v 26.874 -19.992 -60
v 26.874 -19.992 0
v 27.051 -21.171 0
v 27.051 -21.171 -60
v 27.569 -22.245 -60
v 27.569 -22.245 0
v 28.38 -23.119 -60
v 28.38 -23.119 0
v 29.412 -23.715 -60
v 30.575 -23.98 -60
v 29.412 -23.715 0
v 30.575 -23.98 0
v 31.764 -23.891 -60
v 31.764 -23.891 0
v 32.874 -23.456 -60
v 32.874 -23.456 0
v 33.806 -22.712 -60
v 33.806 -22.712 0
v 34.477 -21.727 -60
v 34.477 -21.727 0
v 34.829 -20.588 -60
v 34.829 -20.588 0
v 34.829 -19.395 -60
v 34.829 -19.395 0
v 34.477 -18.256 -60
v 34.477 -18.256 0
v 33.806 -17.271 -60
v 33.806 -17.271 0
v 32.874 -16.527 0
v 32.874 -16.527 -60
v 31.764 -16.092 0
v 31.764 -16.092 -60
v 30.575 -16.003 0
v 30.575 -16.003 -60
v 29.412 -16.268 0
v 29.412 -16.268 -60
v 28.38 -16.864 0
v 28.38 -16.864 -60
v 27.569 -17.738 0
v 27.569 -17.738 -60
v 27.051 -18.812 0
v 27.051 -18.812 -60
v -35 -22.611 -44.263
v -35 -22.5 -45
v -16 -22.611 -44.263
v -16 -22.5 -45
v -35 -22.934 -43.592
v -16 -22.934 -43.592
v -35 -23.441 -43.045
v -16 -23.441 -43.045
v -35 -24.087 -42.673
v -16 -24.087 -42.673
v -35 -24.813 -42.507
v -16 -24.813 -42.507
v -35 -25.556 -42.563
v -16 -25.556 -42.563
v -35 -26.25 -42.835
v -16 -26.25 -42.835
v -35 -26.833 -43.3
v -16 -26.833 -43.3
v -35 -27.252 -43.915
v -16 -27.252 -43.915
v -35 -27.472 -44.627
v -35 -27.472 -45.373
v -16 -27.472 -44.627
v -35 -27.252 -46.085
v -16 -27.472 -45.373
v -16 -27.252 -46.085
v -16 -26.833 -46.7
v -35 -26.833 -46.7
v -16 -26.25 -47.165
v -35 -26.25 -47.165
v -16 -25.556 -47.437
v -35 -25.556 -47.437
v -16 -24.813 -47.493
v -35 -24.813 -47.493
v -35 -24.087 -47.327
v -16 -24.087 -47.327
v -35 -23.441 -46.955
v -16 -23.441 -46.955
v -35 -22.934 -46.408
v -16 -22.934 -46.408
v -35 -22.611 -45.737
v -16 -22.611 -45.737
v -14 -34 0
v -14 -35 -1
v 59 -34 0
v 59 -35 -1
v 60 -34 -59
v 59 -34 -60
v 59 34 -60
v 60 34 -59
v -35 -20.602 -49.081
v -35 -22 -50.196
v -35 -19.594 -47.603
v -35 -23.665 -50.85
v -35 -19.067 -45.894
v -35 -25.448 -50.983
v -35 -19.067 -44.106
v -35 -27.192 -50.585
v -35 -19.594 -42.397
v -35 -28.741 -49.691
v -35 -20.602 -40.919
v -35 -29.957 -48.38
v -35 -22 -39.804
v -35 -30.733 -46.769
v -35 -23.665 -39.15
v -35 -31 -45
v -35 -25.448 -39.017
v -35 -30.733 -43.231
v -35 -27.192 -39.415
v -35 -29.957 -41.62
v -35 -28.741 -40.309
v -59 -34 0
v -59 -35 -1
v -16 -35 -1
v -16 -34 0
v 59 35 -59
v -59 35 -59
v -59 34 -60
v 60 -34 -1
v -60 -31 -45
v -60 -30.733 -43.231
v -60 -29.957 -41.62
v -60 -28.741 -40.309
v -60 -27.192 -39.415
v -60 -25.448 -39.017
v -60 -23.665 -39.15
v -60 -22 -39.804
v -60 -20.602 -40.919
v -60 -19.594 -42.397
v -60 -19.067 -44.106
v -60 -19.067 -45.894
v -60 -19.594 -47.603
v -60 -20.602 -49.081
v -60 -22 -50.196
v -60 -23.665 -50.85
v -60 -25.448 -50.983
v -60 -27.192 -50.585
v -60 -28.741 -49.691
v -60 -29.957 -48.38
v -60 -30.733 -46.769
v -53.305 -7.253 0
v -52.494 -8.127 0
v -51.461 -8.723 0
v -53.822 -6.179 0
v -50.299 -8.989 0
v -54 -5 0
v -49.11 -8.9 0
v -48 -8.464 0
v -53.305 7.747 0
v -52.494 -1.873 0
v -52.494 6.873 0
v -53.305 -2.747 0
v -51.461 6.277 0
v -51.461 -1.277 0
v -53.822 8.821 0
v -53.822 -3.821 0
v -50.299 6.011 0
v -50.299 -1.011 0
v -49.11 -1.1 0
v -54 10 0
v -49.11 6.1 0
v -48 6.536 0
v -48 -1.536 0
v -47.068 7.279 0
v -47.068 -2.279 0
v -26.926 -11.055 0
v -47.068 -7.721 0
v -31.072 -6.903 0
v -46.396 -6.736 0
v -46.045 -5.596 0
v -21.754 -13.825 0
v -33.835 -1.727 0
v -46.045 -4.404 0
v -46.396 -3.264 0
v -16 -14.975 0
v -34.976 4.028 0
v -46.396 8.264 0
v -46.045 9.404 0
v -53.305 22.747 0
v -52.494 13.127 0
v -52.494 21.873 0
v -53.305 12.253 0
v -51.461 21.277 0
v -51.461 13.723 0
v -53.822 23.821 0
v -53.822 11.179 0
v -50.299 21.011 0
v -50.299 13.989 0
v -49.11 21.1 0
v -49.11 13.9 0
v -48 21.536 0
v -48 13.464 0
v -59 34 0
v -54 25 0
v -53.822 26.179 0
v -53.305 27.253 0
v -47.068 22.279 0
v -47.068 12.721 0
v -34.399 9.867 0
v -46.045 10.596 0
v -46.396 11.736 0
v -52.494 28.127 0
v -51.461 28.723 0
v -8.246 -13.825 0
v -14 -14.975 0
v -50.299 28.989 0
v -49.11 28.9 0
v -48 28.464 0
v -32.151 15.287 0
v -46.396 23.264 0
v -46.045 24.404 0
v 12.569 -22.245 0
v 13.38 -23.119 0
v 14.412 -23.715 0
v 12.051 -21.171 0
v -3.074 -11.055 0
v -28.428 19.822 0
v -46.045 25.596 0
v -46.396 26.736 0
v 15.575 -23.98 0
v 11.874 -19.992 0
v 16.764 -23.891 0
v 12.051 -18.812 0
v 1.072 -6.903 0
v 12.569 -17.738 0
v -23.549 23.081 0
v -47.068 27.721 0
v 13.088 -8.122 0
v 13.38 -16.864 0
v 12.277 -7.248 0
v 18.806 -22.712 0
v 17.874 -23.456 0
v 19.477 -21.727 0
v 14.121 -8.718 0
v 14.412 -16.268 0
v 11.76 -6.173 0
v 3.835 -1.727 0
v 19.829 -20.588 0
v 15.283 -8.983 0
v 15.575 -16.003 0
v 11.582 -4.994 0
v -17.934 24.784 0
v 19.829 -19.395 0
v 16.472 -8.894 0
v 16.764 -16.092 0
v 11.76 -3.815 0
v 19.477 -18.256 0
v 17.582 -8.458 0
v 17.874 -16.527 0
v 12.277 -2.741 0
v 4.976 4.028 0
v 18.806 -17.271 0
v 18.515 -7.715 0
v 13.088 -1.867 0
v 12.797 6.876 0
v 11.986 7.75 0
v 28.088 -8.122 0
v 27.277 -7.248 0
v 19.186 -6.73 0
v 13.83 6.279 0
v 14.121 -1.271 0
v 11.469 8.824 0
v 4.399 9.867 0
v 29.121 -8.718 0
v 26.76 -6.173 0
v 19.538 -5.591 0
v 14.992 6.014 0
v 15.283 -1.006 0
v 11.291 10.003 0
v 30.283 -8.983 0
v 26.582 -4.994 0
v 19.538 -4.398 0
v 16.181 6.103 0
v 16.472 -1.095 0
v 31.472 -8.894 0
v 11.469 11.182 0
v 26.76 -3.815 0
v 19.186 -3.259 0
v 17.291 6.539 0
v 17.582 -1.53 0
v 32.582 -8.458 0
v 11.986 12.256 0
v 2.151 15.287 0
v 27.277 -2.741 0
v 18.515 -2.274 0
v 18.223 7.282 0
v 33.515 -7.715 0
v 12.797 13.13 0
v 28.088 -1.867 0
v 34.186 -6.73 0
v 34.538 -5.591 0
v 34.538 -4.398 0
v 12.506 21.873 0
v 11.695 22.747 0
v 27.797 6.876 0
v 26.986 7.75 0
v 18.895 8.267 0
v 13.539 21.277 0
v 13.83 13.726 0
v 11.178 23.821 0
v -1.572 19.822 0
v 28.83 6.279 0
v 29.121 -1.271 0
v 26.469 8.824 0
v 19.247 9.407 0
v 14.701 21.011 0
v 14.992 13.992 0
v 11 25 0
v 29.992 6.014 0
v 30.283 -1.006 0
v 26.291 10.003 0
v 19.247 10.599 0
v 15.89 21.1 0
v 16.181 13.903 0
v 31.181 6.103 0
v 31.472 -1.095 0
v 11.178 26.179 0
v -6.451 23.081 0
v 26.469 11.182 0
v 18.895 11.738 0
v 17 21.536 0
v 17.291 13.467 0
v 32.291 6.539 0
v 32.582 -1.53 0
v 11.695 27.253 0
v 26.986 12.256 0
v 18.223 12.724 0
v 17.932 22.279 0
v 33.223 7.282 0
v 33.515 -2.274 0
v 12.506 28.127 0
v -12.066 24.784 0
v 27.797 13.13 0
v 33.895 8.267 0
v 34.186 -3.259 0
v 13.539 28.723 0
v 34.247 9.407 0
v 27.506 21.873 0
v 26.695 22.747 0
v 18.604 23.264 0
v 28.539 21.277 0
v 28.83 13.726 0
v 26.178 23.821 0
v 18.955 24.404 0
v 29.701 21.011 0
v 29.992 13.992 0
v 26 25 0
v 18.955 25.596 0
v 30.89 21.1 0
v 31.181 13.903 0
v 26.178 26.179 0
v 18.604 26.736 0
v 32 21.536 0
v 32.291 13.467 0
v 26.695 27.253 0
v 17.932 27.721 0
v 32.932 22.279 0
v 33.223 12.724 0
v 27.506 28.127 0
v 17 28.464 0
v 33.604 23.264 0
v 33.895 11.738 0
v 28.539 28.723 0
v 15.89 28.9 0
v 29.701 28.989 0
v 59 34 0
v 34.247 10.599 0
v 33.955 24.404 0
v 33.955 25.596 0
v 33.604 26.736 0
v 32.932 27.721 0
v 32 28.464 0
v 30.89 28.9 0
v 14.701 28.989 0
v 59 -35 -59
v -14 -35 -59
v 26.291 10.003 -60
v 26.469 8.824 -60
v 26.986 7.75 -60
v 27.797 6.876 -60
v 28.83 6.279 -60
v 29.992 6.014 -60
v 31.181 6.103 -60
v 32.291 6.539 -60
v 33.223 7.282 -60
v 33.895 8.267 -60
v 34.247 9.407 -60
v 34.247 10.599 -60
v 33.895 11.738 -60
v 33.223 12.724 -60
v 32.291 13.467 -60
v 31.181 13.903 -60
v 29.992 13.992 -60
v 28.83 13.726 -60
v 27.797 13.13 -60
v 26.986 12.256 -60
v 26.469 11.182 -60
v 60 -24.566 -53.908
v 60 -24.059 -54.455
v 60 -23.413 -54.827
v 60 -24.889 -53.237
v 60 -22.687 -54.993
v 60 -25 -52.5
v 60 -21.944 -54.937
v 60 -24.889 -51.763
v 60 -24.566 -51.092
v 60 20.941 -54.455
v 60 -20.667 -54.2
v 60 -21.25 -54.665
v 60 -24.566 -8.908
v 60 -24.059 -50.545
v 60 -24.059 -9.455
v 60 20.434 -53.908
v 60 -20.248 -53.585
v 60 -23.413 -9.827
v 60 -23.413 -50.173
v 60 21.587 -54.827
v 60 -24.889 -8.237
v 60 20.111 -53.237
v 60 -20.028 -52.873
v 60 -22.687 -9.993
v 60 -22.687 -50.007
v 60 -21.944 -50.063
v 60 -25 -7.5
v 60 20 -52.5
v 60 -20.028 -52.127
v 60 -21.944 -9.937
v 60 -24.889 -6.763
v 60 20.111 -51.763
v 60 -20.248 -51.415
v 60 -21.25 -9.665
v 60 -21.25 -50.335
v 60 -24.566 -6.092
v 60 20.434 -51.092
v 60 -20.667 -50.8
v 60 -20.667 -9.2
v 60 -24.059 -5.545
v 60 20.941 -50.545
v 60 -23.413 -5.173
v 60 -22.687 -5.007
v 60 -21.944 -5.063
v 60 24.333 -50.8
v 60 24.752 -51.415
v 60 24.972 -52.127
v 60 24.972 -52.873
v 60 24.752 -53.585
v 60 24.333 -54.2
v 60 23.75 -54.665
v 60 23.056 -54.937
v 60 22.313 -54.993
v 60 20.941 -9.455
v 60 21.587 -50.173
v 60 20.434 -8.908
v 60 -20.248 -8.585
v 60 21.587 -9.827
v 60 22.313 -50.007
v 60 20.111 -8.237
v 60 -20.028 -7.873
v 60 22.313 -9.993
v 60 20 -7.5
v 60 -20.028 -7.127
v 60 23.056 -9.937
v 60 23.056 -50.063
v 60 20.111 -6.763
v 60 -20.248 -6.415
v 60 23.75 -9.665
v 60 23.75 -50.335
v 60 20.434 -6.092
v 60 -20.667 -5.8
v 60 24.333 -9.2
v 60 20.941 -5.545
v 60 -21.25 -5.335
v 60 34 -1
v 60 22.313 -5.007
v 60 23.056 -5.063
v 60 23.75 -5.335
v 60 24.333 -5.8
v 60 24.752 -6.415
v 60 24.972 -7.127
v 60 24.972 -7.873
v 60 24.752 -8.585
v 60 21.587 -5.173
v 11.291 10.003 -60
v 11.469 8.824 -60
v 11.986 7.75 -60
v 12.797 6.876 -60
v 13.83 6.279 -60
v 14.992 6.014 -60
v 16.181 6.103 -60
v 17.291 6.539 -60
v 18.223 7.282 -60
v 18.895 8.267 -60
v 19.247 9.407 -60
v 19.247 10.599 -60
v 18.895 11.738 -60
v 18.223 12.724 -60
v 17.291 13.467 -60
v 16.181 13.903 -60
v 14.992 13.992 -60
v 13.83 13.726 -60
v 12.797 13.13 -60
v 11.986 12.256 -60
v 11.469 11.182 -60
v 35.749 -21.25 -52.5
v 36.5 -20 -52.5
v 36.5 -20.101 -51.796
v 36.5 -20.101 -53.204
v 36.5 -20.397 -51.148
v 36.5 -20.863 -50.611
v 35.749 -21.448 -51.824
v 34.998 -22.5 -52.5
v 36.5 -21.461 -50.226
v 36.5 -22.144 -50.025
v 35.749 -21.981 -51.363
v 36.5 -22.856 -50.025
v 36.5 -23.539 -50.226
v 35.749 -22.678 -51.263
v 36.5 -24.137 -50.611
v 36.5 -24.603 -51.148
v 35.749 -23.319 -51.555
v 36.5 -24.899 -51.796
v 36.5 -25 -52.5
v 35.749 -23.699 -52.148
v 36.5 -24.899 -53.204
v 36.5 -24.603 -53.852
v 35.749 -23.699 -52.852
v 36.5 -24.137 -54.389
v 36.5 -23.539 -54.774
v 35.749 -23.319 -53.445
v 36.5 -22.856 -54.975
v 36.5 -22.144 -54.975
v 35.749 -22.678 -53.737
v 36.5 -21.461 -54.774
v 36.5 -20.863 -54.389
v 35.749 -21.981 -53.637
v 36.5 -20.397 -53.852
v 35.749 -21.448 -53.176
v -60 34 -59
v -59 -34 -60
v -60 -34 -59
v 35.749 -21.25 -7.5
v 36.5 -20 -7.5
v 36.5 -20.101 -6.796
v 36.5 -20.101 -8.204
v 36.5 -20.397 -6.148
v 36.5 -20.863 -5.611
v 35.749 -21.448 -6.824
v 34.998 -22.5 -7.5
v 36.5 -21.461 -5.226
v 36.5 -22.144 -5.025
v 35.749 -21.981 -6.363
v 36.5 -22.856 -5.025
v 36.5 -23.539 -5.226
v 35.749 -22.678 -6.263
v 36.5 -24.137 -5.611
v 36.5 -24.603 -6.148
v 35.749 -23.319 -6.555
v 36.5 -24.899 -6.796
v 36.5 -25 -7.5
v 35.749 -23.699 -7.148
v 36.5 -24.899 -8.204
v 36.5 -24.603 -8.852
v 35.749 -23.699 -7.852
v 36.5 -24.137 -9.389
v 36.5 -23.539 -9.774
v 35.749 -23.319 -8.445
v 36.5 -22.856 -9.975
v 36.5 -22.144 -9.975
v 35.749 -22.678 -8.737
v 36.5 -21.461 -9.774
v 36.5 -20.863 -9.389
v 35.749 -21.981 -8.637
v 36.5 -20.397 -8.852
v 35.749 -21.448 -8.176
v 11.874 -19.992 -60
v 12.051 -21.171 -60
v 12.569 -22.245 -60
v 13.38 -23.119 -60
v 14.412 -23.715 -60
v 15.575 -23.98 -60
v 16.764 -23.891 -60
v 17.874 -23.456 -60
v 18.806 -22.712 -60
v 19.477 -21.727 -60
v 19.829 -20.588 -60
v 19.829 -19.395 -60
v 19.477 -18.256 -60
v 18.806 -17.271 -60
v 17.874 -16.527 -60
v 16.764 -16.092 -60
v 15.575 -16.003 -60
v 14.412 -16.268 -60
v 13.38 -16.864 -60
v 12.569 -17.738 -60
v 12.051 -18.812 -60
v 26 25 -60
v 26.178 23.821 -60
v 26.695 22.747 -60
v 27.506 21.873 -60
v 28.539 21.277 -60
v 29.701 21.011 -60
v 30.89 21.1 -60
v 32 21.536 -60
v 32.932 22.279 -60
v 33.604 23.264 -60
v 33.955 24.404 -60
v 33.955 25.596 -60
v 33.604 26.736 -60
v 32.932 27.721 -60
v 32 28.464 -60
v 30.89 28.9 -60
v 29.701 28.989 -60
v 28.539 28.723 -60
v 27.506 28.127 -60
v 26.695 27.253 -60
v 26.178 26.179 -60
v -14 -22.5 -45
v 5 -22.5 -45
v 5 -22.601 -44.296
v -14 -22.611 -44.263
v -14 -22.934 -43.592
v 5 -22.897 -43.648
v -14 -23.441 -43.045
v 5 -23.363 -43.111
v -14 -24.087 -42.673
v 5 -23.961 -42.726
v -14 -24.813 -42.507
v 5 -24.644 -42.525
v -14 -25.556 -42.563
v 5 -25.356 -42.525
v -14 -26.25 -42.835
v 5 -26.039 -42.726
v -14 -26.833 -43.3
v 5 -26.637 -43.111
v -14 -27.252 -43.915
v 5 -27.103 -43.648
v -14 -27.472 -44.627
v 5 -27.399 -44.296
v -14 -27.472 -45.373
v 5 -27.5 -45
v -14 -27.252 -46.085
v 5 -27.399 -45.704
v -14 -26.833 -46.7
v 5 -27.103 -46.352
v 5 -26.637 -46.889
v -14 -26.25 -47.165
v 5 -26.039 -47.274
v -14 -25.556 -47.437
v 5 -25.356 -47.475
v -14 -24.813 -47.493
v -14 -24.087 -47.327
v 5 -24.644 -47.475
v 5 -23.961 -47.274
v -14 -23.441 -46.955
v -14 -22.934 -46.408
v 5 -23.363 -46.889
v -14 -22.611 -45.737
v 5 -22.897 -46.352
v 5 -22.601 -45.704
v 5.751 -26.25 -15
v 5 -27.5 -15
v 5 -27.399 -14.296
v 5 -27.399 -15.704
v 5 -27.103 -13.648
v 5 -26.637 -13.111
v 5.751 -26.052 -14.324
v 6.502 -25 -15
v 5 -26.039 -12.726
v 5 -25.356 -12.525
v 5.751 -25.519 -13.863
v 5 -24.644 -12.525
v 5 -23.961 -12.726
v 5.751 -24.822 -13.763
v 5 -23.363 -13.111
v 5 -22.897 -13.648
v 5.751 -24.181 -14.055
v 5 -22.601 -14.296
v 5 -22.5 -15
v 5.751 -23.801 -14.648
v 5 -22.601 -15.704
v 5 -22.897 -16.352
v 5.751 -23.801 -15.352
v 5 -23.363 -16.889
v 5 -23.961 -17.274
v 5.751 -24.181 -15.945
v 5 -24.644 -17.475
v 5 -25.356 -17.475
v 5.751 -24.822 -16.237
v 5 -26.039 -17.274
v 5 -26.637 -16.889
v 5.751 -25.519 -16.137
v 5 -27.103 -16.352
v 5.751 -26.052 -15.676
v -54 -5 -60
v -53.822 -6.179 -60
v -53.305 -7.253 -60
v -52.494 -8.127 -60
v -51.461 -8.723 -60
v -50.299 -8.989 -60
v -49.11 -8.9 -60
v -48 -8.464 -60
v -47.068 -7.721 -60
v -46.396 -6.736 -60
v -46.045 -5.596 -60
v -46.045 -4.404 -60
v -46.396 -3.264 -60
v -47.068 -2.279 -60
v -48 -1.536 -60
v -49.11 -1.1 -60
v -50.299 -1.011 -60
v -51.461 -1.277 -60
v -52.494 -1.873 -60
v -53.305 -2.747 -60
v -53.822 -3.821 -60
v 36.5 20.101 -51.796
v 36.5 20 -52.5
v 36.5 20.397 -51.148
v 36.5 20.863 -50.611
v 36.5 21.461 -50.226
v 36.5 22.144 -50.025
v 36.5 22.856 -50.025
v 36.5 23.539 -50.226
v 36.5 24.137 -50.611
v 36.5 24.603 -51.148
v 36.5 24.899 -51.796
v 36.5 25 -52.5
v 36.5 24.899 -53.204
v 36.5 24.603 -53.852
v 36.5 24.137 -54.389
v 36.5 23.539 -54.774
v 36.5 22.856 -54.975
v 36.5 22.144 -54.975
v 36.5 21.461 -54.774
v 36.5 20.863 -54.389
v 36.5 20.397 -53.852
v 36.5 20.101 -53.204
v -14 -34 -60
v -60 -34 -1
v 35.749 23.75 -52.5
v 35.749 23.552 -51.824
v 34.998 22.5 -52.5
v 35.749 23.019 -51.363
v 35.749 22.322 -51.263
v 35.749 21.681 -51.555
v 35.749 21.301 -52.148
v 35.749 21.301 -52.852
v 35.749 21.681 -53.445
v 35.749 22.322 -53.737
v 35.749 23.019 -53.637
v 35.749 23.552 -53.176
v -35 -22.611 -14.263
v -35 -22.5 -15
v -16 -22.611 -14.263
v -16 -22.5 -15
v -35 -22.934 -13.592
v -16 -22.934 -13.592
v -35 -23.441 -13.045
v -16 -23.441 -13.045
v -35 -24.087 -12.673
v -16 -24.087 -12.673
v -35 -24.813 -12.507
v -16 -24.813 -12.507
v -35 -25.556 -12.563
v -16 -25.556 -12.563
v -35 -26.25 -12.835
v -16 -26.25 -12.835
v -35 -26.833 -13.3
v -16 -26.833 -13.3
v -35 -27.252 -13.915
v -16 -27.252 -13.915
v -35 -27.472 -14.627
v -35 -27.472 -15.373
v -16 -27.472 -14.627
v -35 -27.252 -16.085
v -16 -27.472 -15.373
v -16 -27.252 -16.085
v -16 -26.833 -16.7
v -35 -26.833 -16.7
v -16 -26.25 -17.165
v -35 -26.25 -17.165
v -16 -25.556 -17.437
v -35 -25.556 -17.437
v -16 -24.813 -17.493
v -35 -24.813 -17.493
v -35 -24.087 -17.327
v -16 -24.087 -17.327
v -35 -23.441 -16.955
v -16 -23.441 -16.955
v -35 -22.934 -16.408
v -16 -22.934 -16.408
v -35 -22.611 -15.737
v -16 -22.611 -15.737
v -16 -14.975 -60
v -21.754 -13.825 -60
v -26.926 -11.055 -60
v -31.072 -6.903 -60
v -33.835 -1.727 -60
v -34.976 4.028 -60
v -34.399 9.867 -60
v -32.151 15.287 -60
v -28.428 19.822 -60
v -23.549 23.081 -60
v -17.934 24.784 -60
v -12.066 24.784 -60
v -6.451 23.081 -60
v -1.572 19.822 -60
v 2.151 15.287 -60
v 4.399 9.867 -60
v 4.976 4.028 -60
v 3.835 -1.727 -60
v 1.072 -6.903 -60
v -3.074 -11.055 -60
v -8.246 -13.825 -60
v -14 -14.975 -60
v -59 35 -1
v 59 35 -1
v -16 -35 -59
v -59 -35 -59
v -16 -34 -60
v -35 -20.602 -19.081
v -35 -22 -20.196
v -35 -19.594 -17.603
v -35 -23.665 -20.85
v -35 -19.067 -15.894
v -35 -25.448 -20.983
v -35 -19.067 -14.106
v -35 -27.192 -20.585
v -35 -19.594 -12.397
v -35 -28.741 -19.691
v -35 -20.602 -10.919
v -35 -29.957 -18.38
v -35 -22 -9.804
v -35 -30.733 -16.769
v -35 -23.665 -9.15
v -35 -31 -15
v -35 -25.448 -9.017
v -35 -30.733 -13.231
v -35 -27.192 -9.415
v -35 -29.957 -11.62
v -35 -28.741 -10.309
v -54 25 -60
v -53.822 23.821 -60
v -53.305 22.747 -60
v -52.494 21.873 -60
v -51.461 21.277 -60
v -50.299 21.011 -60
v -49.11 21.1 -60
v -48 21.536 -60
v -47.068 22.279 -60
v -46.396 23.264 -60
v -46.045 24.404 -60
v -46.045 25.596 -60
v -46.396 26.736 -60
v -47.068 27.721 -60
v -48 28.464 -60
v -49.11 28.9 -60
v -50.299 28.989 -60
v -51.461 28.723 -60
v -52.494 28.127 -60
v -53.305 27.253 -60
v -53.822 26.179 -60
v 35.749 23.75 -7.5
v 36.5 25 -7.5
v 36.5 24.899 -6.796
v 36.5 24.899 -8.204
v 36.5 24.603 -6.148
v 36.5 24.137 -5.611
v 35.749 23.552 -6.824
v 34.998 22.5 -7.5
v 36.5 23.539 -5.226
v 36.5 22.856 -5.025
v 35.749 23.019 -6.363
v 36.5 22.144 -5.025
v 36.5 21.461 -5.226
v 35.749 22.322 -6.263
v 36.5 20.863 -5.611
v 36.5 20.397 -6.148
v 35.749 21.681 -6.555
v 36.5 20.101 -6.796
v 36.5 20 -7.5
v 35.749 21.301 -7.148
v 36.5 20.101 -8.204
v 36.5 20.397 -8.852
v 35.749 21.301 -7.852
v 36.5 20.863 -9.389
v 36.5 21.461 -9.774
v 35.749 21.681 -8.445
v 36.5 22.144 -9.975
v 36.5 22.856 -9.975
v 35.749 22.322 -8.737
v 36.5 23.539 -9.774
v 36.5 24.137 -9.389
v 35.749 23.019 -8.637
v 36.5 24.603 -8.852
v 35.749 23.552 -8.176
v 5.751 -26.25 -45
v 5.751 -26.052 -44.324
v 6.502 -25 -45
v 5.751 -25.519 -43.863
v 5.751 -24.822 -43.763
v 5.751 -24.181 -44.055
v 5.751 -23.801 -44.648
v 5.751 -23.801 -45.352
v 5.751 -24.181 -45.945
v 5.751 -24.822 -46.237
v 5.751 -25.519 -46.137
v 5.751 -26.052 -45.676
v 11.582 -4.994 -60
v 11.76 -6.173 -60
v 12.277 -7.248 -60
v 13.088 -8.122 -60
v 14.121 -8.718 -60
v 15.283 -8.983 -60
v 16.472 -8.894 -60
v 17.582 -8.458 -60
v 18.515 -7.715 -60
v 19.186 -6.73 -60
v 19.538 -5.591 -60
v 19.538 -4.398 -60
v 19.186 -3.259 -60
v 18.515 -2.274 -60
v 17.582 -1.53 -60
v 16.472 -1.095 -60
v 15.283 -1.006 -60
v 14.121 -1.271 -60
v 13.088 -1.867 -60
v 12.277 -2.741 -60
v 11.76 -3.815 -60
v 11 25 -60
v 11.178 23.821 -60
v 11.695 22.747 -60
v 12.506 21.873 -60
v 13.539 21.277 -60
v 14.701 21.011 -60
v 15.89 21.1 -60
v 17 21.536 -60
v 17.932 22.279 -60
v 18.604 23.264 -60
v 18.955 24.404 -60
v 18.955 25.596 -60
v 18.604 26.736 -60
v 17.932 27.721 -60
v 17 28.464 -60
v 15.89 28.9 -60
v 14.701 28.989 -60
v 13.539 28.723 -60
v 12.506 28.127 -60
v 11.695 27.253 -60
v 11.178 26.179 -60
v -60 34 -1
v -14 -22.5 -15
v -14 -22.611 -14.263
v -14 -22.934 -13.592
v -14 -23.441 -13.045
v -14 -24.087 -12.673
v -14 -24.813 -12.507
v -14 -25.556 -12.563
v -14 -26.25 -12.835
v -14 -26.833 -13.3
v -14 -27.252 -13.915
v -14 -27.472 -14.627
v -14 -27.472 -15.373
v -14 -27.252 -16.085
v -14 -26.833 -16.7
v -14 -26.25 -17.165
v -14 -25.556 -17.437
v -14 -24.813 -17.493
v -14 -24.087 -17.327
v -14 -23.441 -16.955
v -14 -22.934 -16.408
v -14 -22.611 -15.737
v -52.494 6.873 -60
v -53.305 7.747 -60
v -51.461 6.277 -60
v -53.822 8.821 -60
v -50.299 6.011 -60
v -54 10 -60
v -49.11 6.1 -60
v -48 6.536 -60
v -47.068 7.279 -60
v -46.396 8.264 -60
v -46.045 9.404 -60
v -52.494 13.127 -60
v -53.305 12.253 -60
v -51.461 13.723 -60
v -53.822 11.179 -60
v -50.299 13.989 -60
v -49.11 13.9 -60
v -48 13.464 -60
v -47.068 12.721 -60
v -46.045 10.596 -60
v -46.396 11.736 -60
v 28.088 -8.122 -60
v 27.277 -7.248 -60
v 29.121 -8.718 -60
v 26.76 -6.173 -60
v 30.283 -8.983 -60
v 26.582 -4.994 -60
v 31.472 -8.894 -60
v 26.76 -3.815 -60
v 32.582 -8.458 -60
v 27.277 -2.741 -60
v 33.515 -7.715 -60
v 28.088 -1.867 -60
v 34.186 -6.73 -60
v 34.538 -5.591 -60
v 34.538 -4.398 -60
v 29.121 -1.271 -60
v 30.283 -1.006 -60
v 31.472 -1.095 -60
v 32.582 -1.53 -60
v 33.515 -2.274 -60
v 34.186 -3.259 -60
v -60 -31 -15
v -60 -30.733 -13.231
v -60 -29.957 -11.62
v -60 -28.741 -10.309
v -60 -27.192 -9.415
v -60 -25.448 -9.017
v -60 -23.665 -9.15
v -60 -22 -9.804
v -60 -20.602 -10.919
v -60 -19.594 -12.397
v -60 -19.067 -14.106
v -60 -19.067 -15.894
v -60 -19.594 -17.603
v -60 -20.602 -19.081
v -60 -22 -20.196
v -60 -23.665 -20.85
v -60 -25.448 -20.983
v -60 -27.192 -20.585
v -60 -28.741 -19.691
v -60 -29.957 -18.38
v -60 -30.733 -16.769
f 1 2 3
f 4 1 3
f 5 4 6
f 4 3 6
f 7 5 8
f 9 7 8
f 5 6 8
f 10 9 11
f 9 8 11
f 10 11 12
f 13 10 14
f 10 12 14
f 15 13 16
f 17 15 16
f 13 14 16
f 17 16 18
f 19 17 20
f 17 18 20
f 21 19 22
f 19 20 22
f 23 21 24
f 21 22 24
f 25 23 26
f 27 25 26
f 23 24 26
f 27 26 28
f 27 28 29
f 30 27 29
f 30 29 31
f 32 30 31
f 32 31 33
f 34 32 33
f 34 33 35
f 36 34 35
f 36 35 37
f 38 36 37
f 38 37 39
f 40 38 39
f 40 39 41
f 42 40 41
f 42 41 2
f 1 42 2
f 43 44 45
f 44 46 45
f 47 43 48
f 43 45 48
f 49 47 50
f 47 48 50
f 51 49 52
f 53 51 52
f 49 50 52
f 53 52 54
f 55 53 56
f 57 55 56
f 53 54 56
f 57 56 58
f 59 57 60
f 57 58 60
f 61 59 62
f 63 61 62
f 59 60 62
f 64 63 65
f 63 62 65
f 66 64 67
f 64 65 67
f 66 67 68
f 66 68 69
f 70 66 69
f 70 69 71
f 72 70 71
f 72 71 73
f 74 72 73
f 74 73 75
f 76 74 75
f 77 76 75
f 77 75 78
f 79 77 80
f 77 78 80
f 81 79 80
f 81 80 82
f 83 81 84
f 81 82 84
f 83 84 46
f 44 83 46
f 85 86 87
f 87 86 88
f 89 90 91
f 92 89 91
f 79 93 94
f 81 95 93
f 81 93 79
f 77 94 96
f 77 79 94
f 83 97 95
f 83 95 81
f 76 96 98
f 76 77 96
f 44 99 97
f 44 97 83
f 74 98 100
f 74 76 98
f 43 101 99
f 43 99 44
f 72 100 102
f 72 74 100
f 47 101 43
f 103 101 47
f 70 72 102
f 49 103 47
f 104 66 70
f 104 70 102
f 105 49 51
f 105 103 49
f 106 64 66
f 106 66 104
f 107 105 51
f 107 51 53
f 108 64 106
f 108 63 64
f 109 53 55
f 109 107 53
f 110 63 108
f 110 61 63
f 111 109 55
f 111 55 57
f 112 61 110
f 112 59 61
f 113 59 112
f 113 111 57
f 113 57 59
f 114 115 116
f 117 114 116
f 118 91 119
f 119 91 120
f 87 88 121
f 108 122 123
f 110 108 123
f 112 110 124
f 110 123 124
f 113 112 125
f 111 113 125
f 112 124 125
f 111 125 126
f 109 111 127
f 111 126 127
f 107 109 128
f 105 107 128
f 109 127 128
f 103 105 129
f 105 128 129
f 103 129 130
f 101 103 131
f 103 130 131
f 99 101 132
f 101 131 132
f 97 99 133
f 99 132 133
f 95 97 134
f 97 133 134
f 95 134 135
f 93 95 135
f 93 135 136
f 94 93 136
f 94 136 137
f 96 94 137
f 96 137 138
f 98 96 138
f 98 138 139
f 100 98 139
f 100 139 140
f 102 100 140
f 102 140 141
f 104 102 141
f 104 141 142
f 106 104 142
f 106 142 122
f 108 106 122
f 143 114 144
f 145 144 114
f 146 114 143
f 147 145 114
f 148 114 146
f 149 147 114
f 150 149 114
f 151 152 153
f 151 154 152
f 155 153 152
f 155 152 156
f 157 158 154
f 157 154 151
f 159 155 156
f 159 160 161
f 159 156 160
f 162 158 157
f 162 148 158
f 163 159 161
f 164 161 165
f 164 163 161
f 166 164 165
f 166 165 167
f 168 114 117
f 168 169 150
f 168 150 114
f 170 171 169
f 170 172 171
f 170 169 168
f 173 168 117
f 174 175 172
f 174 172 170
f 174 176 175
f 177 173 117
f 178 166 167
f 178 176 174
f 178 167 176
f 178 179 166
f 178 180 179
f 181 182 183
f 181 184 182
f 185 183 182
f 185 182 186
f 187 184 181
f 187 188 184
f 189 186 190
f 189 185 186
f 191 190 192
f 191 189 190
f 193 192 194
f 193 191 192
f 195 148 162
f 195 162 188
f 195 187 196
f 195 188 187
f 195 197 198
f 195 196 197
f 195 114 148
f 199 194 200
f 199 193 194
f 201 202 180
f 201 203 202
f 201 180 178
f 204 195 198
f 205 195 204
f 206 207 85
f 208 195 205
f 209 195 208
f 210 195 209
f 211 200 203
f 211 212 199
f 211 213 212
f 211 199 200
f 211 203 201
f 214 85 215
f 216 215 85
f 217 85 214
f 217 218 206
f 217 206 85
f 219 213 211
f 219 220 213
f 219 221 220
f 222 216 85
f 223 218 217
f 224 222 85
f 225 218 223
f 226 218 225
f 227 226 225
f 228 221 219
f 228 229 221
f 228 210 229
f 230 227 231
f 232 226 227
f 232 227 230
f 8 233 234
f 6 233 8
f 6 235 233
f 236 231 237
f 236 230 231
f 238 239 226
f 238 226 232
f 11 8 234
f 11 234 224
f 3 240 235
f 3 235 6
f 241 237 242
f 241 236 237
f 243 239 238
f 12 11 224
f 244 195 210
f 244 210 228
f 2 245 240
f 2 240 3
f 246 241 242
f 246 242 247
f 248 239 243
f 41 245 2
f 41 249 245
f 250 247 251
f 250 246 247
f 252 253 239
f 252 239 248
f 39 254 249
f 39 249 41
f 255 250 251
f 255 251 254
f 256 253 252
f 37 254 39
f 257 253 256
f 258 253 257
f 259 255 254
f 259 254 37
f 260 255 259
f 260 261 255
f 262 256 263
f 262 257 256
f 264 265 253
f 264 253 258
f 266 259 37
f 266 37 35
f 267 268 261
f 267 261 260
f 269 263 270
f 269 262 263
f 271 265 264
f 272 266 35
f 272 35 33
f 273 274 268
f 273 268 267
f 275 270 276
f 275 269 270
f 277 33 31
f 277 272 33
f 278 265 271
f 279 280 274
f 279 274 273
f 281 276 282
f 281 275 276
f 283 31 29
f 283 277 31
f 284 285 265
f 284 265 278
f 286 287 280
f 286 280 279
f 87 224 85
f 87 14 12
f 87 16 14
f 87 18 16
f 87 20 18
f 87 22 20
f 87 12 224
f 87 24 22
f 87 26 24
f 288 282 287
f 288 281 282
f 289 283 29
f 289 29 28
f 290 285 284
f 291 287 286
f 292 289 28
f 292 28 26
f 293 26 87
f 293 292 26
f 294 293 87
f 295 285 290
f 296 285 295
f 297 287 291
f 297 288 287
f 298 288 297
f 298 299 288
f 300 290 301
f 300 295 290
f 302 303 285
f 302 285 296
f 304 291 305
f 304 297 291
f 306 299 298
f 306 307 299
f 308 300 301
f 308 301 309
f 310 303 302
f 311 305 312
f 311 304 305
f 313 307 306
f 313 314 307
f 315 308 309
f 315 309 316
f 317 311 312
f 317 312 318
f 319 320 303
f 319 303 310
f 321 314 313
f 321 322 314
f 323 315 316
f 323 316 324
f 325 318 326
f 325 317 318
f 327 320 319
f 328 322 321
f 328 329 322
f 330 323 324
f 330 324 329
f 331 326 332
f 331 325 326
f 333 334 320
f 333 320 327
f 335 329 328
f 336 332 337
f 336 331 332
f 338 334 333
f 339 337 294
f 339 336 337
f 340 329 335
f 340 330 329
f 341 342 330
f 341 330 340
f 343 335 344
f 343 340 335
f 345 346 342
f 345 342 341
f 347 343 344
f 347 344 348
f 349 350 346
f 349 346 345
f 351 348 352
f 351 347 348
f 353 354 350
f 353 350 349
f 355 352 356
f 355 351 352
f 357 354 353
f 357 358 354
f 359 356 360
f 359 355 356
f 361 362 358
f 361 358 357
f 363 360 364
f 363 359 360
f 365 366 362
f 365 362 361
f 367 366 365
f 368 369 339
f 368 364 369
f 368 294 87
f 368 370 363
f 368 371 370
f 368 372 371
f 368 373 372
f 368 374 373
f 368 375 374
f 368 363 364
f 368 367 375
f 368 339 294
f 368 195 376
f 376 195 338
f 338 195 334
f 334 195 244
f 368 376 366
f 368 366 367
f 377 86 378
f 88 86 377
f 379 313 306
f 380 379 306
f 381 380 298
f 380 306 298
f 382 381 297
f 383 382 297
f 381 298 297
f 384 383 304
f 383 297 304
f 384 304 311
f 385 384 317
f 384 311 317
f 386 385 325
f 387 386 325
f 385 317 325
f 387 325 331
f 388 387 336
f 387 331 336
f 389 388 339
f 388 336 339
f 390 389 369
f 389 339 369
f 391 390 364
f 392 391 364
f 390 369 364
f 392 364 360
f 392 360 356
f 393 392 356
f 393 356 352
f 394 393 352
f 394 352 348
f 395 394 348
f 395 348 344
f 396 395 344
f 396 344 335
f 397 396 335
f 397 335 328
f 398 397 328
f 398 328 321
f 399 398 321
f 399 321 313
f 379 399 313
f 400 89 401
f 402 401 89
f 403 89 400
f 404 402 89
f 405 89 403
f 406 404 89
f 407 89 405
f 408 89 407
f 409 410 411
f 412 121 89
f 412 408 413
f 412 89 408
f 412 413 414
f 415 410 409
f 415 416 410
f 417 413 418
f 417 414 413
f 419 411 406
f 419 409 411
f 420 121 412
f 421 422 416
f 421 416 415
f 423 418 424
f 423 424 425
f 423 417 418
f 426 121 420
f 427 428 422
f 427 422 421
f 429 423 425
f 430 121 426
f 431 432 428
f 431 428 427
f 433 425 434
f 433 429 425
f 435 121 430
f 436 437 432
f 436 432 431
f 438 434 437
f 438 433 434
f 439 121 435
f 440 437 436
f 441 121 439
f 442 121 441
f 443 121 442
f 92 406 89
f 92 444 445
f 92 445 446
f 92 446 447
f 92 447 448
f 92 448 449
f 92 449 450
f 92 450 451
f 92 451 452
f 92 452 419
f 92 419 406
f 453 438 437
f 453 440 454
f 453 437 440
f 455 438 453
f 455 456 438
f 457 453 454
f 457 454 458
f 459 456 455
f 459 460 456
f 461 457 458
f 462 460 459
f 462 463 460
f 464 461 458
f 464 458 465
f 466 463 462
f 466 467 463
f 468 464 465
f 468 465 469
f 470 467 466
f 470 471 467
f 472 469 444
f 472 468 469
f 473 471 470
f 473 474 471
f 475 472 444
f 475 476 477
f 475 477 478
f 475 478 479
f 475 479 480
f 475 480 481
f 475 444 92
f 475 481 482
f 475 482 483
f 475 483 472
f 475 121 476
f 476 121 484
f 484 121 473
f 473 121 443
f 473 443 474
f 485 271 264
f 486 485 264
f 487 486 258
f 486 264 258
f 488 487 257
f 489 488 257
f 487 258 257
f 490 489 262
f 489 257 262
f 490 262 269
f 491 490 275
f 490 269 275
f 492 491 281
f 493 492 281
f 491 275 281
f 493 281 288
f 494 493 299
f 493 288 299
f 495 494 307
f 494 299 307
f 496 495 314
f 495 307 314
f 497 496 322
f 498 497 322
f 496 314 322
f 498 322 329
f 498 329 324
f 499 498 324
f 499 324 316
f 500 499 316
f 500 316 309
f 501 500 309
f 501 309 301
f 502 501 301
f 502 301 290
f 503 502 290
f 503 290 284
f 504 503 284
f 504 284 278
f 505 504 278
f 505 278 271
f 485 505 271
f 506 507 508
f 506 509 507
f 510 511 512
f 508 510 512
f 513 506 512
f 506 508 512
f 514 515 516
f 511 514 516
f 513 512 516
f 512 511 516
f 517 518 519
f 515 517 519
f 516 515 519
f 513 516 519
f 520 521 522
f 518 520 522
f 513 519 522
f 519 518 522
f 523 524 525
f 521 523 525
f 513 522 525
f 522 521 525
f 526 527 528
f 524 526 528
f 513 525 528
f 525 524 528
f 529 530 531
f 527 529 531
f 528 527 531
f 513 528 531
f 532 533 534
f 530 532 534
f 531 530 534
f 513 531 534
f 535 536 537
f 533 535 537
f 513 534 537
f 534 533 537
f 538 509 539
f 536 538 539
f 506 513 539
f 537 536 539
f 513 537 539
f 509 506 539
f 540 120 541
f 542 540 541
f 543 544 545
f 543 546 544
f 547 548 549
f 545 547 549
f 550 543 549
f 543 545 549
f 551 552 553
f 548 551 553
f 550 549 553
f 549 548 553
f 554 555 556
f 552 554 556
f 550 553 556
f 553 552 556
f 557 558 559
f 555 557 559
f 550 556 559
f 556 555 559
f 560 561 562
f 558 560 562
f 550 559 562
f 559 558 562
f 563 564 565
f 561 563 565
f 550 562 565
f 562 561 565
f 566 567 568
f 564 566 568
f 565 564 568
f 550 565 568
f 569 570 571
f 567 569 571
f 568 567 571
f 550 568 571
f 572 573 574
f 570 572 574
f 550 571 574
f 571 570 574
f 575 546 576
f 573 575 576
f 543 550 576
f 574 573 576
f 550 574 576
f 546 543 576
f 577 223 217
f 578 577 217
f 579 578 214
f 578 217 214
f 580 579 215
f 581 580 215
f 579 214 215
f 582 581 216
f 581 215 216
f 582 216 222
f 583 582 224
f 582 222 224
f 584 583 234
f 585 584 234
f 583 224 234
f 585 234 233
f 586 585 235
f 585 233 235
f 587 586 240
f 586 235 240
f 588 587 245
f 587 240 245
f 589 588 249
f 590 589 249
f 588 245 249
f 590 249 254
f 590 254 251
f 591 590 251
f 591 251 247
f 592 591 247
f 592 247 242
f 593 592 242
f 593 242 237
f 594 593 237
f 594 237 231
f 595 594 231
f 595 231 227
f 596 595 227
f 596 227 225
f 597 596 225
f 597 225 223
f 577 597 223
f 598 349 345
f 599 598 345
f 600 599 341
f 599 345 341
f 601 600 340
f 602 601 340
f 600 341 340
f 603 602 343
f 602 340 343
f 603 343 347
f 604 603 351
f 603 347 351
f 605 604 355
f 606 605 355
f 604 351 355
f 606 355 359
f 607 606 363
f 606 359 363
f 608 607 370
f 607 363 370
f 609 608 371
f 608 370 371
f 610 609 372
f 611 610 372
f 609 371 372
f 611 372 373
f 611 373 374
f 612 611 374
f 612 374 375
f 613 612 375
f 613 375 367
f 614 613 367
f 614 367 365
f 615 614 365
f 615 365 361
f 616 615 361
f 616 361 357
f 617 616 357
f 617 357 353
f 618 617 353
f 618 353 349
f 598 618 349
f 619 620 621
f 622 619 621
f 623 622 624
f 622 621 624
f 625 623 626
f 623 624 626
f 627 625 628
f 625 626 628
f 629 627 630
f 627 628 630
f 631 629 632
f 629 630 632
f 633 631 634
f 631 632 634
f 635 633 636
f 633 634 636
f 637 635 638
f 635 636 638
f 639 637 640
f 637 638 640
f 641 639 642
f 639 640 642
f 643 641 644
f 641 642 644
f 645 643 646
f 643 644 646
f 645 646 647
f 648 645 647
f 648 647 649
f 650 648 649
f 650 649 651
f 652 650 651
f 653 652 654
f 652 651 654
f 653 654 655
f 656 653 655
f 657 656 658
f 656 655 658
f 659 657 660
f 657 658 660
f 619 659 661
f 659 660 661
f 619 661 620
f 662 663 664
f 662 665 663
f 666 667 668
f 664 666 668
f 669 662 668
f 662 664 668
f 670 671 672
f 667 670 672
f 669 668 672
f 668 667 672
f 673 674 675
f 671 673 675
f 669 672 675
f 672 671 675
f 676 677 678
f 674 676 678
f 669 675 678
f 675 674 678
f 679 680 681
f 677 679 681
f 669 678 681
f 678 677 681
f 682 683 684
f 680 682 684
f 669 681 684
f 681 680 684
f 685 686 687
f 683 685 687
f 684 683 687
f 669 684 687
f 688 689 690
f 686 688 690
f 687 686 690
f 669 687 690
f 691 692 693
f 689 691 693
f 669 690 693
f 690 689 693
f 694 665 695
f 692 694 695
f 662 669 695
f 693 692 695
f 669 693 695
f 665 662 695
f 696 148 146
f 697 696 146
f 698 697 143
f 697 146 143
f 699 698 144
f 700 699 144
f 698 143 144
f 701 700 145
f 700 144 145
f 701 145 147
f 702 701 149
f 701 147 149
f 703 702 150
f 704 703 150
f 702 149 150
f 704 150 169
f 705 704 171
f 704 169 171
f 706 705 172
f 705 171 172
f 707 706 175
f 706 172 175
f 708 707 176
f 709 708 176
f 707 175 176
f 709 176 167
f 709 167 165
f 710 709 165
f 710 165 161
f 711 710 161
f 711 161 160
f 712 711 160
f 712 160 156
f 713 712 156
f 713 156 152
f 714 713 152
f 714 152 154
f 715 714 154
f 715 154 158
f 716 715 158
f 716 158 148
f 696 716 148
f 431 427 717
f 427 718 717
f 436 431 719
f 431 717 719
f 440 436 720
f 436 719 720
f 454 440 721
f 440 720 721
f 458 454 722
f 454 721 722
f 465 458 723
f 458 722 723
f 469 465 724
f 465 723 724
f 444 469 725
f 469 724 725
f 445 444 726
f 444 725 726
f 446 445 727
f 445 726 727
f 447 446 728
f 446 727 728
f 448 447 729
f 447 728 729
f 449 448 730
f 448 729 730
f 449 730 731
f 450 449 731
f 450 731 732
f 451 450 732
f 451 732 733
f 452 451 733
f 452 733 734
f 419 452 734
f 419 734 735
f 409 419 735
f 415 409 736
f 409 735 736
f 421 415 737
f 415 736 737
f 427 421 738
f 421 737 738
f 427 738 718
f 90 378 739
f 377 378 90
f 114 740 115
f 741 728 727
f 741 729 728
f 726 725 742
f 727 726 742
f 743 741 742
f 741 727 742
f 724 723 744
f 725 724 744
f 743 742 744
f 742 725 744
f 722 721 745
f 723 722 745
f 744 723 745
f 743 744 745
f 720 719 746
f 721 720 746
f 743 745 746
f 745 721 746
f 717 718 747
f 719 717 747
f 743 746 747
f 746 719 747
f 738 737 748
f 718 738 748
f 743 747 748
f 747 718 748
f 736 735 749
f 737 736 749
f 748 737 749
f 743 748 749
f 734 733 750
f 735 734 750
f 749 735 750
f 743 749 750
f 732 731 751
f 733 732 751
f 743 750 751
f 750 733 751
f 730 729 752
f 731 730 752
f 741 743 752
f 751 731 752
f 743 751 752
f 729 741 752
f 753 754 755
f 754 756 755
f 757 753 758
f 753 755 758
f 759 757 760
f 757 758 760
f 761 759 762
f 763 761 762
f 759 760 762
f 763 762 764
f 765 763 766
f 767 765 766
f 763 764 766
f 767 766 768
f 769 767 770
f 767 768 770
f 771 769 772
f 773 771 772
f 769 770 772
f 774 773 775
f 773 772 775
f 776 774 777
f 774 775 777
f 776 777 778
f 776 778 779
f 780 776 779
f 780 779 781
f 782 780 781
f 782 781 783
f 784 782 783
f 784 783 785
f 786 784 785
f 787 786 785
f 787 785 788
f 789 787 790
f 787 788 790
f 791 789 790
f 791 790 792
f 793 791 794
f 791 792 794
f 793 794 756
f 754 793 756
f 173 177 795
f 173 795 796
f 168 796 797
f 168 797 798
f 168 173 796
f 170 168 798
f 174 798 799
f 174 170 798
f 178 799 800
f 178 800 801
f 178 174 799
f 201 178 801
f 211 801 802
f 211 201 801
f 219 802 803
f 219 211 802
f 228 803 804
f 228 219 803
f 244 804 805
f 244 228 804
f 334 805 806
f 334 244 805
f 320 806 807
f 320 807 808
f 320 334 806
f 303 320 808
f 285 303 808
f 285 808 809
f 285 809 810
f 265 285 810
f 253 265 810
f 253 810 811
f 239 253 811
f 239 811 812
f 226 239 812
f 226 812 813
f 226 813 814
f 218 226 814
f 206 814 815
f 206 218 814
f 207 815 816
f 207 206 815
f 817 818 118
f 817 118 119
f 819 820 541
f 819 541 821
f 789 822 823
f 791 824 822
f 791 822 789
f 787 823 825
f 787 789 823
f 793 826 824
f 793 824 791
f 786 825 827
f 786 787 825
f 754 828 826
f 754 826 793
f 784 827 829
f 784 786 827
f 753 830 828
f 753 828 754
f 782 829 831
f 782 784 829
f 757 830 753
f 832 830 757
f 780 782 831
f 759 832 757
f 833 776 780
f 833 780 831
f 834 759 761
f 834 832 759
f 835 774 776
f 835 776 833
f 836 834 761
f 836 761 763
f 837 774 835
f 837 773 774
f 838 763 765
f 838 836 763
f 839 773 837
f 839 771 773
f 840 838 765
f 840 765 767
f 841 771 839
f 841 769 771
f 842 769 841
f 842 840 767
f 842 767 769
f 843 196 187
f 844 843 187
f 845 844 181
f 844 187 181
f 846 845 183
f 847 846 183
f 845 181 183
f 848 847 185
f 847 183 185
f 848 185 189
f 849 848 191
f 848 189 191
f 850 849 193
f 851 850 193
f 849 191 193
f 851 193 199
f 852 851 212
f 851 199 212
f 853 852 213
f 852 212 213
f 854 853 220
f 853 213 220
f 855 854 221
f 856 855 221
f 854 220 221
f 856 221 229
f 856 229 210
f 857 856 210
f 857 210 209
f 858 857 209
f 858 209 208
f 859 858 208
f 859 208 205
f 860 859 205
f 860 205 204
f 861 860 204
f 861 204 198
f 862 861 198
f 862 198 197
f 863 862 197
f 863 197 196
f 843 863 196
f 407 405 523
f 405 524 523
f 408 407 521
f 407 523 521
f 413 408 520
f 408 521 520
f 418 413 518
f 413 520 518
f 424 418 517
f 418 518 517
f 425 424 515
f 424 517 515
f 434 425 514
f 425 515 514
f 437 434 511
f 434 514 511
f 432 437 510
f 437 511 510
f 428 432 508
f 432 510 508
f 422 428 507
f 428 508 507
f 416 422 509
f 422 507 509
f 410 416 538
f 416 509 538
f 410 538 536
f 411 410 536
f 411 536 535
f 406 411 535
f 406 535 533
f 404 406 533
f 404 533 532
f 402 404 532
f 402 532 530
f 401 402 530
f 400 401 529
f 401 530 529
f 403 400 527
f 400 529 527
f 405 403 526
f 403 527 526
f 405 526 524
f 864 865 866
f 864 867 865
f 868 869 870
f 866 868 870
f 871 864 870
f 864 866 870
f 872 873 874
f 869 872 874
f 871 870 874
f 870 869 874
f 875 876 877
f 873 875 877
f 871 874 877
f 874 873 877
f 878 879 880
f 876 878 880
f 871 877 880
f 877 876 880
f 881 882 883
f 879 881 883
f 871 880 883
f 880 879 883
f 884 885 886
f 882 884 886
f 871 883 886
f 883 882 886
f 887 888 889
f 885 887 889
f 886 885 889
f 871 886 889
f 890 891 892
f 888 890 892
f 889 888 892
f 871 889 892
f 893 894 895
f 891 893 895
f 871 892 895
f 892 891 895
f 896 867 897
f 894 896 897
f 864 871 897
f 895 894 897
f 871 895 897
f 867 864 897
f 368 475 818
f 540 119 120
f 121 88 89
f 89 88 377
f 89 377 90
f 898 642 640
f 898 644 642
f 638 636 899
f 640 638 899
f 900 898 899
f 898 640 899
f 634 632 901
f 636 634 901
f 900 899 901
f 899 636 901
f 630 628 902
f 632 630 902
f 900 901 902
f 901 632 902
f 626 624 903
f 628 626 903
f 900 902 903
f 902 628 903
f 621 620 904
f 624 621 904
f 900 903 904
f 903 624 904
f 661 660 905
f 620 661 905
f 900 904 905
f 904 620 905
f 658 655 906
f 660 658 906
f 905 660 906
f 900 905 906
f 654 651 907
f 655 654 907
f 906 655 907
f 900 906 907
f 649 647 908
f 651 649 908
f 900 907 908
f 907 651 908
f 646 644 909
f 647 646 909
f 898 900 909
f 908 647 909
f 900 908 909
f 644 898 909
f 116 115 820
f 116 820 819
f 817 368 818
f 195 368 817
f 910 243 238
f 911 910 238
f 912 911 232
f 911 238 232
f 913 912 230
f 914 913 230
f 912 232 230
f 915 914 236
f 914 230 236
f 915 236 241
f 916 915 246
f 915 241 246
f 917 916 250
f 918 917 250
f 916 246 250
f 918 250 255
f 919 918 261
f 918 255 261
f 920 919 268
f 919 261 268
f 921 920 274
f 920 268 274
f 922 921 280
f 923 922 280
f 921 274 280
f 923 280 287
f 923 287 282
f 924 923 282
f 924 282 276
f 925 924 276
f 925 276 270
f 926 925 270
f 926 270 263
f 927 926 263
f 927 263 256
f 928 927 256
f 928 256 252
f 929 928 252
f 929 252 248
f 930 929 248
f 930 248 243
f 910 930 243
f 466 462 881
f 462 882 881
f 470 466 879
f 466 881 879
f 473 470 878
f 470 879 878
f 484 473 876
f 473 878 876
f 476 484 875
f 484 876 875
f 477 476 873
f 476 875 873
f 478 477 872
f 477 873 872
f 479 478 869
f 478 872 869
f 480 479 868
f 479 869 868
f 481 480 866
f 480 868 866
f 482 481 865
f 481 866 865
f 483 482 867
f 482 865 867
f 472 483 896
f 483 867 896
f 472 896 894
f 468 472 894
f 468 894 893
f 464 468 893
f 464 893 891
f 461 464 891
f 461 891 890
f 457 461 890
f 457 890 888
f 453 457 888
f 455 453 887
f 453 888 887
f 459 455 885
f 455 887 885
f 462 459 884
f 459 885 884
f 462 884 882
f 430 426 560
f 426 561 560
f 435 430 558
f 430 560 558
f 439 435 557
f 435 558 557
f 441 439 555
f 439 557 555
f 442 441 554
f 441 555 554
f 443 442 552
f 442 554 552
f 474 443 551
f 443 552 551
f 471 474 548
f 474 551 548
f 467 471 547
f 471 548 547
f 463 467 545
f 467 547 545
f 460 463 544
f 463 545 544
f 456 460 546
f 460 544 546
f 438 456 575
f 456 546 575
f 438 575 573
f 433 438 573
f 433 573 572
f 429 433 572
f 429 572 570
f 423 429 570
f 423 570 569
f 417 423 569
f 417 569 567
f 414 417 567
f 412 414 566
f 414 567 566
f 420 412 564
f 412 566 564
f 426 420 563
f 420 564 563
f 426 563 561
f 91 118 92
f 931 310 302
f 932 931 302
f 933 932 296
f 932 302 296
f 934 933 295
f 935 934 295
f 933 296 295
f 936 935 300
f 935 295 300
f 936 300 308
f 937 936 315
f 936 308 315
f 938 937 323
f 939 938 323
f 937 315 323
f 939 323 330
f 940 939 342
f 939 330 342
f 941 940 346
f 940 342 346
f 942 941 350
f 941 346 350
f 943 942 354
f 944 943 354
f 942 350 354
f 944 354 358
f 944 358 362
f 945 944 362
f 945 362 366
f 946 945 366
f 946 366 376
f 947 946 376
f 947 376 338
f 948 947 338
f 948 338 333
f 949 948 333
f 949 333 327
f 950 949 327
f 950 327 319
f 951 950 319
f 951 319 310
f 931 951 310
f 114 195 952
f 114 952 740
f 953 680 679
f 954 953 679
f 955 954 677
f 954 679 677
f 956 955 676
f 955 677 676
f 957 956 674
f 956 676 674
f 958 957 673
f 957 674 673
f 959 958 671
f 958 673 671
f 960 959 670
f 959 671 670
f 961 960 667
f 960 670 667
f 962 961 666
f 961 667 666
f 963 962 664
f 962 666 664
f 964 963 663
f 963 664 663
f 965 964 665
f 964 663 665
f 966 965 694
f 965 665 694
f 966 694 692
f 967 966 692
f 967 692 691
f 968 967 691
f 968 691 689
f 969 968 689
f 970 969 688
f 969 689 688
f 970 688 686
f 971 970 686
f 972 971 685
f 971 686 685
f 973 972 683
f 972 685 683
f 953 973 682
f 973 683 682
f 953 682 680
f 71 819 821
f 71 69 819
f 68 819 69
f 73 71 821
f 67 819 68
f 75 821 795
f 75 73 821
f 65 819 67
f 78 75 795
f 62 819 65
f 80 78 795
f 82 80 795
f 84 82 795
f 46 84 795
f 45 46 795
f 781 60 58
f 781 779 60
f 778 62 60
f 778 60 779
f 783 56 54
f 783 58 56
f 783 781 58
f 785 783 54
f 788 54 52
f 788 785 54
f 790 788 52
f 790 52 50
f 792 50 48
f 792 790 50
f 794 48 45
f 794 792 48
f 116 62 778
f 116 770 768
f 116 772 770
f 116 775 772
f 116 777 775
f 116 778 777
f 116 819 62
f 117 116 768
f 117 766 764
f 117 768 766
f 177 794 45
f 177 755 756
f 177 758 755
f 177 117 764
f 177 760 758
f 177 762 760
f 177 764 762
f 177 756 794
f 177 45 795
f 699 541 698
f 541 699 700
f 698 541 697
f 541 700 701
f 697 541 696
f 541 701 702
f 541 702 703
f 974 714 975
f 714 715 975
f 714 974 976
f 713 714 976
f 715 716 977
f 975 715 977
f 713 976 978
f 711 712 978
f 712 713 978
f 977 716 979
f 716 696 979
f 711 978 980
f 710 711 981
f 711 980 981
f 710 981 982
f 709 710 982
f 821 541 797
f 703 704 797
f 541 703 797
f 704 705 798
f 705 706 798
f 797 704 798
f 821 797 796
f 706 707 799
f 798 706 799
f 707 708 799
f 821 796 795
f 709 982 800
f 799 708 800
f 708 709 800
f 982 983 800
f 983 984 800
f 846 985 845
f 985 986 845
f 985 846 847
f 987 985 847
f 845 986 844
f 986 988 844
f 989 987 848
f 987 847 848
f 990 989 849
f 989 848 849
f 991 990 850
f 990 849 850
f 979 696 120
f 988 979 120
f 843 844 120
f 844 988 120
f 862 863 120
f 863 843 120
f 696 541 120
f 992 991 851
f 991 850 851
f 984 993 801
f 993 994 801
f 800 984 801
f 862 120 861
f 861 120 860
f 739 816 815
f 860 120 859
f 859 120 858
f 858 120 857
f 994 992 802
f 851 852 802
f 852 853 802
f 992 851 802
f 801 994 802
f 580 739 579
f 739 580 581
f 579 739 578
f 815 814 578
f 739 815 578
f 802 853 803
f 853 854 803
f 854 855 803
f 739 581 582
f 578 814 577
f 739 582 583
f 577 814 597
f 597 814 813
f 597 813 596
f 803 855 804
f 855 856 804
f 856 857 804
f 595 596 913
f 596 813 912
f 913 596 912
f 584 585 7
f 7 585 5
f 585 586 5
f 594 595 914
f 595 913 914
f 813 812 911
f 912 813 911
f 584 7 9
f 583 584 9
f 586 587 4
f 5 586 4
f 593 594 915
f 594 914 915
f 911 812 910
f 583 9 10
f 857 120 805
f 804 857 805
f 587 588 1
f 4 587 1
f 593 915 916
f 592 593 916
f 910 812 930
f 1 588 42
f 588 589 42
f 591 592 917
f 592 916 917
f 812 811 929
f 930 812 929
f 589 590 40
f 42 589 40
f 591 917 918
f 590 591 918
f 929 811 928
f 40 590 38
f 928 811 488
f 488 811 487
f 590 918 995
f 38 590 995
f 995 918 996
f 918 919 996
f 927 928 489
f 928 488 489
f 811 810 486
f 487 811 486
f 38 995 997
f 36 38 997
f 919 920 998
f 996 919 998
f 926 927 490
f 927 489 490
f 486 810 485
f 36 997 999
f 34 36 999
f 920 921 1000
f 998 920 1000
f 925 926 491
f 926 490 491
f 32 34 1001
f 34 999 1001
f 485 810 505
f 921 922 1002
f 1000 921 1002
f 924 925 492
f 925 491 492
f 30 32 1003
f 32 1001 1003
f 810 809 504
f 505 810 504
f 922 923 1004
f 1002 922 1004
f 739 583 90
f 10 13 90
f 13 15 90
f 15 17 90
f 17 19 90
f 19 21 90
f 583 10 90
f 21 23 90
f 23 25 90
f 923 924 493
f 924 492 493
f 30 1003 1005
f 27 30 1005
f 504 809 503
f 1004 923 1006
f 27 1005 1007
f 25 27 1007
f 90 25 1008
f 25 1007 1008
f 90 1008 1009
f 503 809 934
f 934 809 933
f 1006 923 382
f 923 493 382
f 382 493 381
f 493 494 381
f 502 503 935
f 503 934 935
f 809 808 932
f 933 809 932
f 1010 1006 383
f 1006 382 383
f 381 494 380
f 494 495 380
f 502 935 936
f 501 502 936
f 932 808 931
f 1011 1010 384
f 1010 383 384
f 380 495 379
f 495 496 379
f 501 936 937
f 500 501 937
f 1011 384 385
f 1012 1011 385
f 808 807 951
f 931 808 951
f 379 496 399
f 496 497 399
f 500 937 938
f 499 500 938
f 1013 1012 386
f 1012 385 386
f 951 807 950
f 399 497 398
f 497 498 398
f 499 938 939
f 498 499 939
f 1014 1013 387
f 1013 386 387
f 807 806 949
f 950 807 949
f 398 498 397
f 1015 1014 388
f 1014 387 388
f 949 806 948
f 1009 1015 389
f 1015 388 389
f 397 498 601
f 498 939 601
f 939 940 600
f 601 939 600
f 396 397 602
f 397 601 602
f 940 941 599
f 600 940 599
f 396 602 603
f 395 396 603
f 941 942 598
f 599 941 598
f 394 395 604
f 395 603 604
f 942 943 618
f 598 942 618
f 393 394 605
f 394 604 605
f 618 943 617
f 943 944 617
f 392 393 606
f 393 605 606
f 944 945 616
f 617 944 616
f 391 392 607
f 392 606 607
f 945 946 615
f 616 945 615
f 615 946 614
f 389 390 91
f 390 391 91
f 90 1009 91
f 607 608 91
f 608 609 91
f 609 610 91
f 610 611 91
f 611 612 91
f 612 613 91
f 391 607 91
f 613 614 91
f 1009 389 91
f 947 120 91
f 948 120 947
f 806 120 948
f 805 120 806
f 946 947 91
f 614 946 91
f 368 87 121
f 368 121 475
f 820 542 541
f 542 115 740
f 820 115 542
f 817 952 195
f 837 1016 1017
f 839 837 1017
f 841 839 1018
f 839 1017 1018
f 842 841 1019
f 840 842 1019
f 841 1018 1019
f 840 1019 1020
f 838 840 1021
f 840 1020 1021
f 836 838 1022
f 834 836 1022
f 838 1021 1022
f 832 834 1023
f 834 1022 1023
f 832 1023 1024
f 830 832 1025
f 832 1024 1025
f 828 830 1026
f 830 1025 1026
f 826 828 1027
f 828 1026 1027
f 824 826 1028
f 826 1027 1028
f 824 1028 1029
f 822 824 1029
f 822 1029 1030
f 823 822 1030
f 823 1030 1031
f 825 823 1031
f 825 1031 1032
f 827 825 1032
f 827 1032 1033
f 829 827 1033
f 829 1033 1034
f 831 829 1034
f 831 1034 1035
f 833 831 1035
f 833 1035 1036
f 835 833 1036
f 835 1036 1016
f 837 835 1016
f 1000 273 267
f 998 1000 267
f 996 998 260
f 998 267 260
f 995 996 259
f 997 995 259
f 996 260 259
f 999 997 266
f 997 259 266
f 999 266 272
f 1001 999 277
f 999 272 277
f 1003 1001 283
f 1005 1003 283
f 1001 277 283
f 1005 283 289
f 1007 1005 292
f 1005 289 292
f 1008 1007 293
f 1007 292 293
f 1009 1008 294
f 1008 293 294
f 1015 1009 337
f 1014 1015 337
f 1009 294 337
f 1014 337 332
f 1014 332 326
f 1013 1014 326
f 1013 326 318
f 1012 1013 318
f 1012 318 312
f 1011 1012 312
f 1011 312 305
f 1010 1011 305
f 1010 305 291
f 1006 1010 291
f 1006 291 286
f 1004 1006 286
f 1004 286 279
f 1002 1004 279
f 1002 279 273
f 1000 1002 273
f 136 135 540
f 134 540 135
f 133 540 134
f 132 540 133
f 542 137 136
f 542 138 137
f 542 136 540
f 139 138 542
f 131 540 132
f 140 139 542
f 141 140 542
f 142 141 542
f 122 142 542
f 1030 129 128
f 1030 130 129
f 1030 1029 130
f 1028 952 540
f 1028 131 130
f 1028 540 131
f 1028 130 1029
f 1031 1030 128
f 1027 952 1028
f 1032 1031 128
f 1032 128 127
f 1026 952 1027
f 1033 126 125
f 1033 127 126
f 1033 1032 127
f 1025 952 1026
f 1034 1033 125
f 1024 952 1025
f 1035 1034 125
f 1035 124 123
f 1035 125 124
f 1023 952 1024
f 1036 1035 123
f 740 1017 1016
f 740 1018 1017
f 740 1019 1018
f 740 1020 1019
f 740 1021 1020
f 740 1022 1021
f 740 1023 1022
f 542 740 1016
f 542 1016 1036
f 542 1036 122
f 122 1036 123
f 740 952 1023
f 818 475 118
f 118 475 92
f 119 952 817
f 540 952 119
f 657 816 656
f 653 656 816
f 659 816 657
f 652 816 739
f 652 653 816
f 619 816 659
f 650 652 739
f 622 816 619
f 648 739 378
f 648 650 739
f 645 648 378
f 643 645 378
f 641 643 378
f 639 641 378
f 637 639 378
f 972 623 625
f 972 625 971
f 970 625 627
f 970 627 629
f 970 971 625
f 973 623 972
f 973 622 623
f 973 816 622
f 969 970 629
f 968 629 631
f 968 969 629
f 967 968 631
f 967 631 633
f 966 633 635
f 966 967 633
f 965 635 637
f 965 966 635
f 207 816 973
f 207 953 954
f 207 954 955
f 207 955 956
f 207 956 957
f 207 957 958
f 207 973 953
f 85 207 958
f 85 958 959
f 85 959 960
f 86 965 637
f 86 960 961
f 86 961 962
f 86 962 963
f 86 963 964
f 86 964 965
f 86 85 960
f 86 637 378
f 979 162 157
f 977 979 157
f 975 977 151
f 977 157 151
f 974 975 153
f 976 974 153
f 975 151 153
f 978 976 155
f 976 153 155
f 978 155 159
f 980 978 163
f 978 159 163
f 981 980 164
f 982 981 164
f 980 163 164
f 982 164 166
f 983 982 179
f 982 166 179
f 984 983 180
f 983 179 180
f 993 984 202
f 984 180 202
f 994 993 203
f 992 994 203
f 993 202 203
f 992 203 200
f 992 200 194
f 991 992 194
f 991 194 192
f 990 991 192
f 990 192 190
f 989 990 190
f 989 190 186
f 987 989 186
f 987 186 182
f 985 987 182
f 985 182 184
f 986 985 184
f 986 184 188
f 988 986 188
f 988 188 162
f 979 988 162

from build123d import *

# Parameters (mm, degrees)
F1_DEPTH       = 60
F3_D           = 5
F3_DEPTH       = 65
F3_CBORE_D     = 12
F3_CBORE_DEPTH = 25
F3_TIP         = 1.5021515476
F4_SIZE        = 1
F6_D           = 5
F6_DEPTH       = 23.5
F6_TIP         = 1.5021515476
F9_D           = 8
F9_ON_F7_D     = 8


with BuildPart() as f1:
    # F0 (on Top) → F1 (new body)
    with BuildSketch(Plane.XY):
        with BuildLine():
            Line((60, 35), (-60, 35))
            Line((-60, 35), (-60, -35))
            Line((-60, -35), (-16, -35))
            Line((-16, -35), (-16, -14.9749843554))
            ThreePointArc((-16, -14.9749843554), (-15, 25), (-14, -14.9749843554))
            Line((-14, -14.9749843554), (-14, -35))
            Line((-14, -35), (60, -35))
            Line((60, -35), (60, 35))
        make_face()
    extrude(amount=-F1_DEPTH)

    # F3
    with Locations(Plane(origin=(-60, 0, 0), x_dir=(0, -1, 0), z_dir=(-1, 0, 0))):
        with Locations((25, -45), (25, -15)):
            CounterBoreHole(F3_D / 2, F3_CBORE_D / 2, F3_CBORE_DEPTH, depth=F3_DEPTH)
            with Locations((0, 0, -(F3_DEPTH + F3_TIP / 2))):  # 118° drill point
                Cone(0, F3_D / 2, F3_TIP, mode=Mode.SUBTRACT)

    # F4
    f4_edges = [f1.edges().sort_by_distance(p)[0] for p in [
        (-60, -35, -30),
        (-60, 35, -30),
        (60, -35, -30),
        (60, 35, -30),
        (0, 35, -60),
        (-60, 0, -60),
        (-38, -35, -60),
        (23, -35, -60),
        (60, 0, -60),
        (-60, 0, 0),
        (-38, -35, 0),
        (23, -35, 0),
        (60, 0, 0),
        (0, 35, 0),
    ]]
    chamfer(f4_edges, length=F4_SIZE)

    # F6
    with Locations(Plane.YZ.offset(60)):
        with Locations((-22.5, -7.5), (22.5, -7.5), (22.5, -52.5), (-22.5, -52.5)):
            Hole(F6_D / 2, depth=F6_DEPTH)
            with Locations((0, 0, -(F6_DEPTH + F6_TIP / 2))):  # 118° drill point
                Cone(0, F6_D / 2, F6_TIP, mode=Mode.SUBTRACT)

    # F9 (through all)
    with Locations(Plane(origin=(0, 0, -60), x_dir=(1, 0, 0), z_dir=(0, 0, -1))):
        with Locations((15, -25), (15.2912072429, -10.0028269883), (15.5824144859, 4.9943460233), (15.8736217288, 19.991519035), (30.8736217288, 19.991519035), (30.5824144859, 4.9943460233), (30.2912072429, -10.0028269883), (30, -25)):
            Hole(F9_D / 2)

    # F9 on F7 (through all)
    with Locations(Plane(origin=(0, 0, -60), x_dir=(1, 0, 0), z_dir=(0, 0, -1))):
        with Locations((-50, -25), (-50, -10), (-50, 5)):
            Hole(F9_ON_F7_D / 2)


solid = f1.part
